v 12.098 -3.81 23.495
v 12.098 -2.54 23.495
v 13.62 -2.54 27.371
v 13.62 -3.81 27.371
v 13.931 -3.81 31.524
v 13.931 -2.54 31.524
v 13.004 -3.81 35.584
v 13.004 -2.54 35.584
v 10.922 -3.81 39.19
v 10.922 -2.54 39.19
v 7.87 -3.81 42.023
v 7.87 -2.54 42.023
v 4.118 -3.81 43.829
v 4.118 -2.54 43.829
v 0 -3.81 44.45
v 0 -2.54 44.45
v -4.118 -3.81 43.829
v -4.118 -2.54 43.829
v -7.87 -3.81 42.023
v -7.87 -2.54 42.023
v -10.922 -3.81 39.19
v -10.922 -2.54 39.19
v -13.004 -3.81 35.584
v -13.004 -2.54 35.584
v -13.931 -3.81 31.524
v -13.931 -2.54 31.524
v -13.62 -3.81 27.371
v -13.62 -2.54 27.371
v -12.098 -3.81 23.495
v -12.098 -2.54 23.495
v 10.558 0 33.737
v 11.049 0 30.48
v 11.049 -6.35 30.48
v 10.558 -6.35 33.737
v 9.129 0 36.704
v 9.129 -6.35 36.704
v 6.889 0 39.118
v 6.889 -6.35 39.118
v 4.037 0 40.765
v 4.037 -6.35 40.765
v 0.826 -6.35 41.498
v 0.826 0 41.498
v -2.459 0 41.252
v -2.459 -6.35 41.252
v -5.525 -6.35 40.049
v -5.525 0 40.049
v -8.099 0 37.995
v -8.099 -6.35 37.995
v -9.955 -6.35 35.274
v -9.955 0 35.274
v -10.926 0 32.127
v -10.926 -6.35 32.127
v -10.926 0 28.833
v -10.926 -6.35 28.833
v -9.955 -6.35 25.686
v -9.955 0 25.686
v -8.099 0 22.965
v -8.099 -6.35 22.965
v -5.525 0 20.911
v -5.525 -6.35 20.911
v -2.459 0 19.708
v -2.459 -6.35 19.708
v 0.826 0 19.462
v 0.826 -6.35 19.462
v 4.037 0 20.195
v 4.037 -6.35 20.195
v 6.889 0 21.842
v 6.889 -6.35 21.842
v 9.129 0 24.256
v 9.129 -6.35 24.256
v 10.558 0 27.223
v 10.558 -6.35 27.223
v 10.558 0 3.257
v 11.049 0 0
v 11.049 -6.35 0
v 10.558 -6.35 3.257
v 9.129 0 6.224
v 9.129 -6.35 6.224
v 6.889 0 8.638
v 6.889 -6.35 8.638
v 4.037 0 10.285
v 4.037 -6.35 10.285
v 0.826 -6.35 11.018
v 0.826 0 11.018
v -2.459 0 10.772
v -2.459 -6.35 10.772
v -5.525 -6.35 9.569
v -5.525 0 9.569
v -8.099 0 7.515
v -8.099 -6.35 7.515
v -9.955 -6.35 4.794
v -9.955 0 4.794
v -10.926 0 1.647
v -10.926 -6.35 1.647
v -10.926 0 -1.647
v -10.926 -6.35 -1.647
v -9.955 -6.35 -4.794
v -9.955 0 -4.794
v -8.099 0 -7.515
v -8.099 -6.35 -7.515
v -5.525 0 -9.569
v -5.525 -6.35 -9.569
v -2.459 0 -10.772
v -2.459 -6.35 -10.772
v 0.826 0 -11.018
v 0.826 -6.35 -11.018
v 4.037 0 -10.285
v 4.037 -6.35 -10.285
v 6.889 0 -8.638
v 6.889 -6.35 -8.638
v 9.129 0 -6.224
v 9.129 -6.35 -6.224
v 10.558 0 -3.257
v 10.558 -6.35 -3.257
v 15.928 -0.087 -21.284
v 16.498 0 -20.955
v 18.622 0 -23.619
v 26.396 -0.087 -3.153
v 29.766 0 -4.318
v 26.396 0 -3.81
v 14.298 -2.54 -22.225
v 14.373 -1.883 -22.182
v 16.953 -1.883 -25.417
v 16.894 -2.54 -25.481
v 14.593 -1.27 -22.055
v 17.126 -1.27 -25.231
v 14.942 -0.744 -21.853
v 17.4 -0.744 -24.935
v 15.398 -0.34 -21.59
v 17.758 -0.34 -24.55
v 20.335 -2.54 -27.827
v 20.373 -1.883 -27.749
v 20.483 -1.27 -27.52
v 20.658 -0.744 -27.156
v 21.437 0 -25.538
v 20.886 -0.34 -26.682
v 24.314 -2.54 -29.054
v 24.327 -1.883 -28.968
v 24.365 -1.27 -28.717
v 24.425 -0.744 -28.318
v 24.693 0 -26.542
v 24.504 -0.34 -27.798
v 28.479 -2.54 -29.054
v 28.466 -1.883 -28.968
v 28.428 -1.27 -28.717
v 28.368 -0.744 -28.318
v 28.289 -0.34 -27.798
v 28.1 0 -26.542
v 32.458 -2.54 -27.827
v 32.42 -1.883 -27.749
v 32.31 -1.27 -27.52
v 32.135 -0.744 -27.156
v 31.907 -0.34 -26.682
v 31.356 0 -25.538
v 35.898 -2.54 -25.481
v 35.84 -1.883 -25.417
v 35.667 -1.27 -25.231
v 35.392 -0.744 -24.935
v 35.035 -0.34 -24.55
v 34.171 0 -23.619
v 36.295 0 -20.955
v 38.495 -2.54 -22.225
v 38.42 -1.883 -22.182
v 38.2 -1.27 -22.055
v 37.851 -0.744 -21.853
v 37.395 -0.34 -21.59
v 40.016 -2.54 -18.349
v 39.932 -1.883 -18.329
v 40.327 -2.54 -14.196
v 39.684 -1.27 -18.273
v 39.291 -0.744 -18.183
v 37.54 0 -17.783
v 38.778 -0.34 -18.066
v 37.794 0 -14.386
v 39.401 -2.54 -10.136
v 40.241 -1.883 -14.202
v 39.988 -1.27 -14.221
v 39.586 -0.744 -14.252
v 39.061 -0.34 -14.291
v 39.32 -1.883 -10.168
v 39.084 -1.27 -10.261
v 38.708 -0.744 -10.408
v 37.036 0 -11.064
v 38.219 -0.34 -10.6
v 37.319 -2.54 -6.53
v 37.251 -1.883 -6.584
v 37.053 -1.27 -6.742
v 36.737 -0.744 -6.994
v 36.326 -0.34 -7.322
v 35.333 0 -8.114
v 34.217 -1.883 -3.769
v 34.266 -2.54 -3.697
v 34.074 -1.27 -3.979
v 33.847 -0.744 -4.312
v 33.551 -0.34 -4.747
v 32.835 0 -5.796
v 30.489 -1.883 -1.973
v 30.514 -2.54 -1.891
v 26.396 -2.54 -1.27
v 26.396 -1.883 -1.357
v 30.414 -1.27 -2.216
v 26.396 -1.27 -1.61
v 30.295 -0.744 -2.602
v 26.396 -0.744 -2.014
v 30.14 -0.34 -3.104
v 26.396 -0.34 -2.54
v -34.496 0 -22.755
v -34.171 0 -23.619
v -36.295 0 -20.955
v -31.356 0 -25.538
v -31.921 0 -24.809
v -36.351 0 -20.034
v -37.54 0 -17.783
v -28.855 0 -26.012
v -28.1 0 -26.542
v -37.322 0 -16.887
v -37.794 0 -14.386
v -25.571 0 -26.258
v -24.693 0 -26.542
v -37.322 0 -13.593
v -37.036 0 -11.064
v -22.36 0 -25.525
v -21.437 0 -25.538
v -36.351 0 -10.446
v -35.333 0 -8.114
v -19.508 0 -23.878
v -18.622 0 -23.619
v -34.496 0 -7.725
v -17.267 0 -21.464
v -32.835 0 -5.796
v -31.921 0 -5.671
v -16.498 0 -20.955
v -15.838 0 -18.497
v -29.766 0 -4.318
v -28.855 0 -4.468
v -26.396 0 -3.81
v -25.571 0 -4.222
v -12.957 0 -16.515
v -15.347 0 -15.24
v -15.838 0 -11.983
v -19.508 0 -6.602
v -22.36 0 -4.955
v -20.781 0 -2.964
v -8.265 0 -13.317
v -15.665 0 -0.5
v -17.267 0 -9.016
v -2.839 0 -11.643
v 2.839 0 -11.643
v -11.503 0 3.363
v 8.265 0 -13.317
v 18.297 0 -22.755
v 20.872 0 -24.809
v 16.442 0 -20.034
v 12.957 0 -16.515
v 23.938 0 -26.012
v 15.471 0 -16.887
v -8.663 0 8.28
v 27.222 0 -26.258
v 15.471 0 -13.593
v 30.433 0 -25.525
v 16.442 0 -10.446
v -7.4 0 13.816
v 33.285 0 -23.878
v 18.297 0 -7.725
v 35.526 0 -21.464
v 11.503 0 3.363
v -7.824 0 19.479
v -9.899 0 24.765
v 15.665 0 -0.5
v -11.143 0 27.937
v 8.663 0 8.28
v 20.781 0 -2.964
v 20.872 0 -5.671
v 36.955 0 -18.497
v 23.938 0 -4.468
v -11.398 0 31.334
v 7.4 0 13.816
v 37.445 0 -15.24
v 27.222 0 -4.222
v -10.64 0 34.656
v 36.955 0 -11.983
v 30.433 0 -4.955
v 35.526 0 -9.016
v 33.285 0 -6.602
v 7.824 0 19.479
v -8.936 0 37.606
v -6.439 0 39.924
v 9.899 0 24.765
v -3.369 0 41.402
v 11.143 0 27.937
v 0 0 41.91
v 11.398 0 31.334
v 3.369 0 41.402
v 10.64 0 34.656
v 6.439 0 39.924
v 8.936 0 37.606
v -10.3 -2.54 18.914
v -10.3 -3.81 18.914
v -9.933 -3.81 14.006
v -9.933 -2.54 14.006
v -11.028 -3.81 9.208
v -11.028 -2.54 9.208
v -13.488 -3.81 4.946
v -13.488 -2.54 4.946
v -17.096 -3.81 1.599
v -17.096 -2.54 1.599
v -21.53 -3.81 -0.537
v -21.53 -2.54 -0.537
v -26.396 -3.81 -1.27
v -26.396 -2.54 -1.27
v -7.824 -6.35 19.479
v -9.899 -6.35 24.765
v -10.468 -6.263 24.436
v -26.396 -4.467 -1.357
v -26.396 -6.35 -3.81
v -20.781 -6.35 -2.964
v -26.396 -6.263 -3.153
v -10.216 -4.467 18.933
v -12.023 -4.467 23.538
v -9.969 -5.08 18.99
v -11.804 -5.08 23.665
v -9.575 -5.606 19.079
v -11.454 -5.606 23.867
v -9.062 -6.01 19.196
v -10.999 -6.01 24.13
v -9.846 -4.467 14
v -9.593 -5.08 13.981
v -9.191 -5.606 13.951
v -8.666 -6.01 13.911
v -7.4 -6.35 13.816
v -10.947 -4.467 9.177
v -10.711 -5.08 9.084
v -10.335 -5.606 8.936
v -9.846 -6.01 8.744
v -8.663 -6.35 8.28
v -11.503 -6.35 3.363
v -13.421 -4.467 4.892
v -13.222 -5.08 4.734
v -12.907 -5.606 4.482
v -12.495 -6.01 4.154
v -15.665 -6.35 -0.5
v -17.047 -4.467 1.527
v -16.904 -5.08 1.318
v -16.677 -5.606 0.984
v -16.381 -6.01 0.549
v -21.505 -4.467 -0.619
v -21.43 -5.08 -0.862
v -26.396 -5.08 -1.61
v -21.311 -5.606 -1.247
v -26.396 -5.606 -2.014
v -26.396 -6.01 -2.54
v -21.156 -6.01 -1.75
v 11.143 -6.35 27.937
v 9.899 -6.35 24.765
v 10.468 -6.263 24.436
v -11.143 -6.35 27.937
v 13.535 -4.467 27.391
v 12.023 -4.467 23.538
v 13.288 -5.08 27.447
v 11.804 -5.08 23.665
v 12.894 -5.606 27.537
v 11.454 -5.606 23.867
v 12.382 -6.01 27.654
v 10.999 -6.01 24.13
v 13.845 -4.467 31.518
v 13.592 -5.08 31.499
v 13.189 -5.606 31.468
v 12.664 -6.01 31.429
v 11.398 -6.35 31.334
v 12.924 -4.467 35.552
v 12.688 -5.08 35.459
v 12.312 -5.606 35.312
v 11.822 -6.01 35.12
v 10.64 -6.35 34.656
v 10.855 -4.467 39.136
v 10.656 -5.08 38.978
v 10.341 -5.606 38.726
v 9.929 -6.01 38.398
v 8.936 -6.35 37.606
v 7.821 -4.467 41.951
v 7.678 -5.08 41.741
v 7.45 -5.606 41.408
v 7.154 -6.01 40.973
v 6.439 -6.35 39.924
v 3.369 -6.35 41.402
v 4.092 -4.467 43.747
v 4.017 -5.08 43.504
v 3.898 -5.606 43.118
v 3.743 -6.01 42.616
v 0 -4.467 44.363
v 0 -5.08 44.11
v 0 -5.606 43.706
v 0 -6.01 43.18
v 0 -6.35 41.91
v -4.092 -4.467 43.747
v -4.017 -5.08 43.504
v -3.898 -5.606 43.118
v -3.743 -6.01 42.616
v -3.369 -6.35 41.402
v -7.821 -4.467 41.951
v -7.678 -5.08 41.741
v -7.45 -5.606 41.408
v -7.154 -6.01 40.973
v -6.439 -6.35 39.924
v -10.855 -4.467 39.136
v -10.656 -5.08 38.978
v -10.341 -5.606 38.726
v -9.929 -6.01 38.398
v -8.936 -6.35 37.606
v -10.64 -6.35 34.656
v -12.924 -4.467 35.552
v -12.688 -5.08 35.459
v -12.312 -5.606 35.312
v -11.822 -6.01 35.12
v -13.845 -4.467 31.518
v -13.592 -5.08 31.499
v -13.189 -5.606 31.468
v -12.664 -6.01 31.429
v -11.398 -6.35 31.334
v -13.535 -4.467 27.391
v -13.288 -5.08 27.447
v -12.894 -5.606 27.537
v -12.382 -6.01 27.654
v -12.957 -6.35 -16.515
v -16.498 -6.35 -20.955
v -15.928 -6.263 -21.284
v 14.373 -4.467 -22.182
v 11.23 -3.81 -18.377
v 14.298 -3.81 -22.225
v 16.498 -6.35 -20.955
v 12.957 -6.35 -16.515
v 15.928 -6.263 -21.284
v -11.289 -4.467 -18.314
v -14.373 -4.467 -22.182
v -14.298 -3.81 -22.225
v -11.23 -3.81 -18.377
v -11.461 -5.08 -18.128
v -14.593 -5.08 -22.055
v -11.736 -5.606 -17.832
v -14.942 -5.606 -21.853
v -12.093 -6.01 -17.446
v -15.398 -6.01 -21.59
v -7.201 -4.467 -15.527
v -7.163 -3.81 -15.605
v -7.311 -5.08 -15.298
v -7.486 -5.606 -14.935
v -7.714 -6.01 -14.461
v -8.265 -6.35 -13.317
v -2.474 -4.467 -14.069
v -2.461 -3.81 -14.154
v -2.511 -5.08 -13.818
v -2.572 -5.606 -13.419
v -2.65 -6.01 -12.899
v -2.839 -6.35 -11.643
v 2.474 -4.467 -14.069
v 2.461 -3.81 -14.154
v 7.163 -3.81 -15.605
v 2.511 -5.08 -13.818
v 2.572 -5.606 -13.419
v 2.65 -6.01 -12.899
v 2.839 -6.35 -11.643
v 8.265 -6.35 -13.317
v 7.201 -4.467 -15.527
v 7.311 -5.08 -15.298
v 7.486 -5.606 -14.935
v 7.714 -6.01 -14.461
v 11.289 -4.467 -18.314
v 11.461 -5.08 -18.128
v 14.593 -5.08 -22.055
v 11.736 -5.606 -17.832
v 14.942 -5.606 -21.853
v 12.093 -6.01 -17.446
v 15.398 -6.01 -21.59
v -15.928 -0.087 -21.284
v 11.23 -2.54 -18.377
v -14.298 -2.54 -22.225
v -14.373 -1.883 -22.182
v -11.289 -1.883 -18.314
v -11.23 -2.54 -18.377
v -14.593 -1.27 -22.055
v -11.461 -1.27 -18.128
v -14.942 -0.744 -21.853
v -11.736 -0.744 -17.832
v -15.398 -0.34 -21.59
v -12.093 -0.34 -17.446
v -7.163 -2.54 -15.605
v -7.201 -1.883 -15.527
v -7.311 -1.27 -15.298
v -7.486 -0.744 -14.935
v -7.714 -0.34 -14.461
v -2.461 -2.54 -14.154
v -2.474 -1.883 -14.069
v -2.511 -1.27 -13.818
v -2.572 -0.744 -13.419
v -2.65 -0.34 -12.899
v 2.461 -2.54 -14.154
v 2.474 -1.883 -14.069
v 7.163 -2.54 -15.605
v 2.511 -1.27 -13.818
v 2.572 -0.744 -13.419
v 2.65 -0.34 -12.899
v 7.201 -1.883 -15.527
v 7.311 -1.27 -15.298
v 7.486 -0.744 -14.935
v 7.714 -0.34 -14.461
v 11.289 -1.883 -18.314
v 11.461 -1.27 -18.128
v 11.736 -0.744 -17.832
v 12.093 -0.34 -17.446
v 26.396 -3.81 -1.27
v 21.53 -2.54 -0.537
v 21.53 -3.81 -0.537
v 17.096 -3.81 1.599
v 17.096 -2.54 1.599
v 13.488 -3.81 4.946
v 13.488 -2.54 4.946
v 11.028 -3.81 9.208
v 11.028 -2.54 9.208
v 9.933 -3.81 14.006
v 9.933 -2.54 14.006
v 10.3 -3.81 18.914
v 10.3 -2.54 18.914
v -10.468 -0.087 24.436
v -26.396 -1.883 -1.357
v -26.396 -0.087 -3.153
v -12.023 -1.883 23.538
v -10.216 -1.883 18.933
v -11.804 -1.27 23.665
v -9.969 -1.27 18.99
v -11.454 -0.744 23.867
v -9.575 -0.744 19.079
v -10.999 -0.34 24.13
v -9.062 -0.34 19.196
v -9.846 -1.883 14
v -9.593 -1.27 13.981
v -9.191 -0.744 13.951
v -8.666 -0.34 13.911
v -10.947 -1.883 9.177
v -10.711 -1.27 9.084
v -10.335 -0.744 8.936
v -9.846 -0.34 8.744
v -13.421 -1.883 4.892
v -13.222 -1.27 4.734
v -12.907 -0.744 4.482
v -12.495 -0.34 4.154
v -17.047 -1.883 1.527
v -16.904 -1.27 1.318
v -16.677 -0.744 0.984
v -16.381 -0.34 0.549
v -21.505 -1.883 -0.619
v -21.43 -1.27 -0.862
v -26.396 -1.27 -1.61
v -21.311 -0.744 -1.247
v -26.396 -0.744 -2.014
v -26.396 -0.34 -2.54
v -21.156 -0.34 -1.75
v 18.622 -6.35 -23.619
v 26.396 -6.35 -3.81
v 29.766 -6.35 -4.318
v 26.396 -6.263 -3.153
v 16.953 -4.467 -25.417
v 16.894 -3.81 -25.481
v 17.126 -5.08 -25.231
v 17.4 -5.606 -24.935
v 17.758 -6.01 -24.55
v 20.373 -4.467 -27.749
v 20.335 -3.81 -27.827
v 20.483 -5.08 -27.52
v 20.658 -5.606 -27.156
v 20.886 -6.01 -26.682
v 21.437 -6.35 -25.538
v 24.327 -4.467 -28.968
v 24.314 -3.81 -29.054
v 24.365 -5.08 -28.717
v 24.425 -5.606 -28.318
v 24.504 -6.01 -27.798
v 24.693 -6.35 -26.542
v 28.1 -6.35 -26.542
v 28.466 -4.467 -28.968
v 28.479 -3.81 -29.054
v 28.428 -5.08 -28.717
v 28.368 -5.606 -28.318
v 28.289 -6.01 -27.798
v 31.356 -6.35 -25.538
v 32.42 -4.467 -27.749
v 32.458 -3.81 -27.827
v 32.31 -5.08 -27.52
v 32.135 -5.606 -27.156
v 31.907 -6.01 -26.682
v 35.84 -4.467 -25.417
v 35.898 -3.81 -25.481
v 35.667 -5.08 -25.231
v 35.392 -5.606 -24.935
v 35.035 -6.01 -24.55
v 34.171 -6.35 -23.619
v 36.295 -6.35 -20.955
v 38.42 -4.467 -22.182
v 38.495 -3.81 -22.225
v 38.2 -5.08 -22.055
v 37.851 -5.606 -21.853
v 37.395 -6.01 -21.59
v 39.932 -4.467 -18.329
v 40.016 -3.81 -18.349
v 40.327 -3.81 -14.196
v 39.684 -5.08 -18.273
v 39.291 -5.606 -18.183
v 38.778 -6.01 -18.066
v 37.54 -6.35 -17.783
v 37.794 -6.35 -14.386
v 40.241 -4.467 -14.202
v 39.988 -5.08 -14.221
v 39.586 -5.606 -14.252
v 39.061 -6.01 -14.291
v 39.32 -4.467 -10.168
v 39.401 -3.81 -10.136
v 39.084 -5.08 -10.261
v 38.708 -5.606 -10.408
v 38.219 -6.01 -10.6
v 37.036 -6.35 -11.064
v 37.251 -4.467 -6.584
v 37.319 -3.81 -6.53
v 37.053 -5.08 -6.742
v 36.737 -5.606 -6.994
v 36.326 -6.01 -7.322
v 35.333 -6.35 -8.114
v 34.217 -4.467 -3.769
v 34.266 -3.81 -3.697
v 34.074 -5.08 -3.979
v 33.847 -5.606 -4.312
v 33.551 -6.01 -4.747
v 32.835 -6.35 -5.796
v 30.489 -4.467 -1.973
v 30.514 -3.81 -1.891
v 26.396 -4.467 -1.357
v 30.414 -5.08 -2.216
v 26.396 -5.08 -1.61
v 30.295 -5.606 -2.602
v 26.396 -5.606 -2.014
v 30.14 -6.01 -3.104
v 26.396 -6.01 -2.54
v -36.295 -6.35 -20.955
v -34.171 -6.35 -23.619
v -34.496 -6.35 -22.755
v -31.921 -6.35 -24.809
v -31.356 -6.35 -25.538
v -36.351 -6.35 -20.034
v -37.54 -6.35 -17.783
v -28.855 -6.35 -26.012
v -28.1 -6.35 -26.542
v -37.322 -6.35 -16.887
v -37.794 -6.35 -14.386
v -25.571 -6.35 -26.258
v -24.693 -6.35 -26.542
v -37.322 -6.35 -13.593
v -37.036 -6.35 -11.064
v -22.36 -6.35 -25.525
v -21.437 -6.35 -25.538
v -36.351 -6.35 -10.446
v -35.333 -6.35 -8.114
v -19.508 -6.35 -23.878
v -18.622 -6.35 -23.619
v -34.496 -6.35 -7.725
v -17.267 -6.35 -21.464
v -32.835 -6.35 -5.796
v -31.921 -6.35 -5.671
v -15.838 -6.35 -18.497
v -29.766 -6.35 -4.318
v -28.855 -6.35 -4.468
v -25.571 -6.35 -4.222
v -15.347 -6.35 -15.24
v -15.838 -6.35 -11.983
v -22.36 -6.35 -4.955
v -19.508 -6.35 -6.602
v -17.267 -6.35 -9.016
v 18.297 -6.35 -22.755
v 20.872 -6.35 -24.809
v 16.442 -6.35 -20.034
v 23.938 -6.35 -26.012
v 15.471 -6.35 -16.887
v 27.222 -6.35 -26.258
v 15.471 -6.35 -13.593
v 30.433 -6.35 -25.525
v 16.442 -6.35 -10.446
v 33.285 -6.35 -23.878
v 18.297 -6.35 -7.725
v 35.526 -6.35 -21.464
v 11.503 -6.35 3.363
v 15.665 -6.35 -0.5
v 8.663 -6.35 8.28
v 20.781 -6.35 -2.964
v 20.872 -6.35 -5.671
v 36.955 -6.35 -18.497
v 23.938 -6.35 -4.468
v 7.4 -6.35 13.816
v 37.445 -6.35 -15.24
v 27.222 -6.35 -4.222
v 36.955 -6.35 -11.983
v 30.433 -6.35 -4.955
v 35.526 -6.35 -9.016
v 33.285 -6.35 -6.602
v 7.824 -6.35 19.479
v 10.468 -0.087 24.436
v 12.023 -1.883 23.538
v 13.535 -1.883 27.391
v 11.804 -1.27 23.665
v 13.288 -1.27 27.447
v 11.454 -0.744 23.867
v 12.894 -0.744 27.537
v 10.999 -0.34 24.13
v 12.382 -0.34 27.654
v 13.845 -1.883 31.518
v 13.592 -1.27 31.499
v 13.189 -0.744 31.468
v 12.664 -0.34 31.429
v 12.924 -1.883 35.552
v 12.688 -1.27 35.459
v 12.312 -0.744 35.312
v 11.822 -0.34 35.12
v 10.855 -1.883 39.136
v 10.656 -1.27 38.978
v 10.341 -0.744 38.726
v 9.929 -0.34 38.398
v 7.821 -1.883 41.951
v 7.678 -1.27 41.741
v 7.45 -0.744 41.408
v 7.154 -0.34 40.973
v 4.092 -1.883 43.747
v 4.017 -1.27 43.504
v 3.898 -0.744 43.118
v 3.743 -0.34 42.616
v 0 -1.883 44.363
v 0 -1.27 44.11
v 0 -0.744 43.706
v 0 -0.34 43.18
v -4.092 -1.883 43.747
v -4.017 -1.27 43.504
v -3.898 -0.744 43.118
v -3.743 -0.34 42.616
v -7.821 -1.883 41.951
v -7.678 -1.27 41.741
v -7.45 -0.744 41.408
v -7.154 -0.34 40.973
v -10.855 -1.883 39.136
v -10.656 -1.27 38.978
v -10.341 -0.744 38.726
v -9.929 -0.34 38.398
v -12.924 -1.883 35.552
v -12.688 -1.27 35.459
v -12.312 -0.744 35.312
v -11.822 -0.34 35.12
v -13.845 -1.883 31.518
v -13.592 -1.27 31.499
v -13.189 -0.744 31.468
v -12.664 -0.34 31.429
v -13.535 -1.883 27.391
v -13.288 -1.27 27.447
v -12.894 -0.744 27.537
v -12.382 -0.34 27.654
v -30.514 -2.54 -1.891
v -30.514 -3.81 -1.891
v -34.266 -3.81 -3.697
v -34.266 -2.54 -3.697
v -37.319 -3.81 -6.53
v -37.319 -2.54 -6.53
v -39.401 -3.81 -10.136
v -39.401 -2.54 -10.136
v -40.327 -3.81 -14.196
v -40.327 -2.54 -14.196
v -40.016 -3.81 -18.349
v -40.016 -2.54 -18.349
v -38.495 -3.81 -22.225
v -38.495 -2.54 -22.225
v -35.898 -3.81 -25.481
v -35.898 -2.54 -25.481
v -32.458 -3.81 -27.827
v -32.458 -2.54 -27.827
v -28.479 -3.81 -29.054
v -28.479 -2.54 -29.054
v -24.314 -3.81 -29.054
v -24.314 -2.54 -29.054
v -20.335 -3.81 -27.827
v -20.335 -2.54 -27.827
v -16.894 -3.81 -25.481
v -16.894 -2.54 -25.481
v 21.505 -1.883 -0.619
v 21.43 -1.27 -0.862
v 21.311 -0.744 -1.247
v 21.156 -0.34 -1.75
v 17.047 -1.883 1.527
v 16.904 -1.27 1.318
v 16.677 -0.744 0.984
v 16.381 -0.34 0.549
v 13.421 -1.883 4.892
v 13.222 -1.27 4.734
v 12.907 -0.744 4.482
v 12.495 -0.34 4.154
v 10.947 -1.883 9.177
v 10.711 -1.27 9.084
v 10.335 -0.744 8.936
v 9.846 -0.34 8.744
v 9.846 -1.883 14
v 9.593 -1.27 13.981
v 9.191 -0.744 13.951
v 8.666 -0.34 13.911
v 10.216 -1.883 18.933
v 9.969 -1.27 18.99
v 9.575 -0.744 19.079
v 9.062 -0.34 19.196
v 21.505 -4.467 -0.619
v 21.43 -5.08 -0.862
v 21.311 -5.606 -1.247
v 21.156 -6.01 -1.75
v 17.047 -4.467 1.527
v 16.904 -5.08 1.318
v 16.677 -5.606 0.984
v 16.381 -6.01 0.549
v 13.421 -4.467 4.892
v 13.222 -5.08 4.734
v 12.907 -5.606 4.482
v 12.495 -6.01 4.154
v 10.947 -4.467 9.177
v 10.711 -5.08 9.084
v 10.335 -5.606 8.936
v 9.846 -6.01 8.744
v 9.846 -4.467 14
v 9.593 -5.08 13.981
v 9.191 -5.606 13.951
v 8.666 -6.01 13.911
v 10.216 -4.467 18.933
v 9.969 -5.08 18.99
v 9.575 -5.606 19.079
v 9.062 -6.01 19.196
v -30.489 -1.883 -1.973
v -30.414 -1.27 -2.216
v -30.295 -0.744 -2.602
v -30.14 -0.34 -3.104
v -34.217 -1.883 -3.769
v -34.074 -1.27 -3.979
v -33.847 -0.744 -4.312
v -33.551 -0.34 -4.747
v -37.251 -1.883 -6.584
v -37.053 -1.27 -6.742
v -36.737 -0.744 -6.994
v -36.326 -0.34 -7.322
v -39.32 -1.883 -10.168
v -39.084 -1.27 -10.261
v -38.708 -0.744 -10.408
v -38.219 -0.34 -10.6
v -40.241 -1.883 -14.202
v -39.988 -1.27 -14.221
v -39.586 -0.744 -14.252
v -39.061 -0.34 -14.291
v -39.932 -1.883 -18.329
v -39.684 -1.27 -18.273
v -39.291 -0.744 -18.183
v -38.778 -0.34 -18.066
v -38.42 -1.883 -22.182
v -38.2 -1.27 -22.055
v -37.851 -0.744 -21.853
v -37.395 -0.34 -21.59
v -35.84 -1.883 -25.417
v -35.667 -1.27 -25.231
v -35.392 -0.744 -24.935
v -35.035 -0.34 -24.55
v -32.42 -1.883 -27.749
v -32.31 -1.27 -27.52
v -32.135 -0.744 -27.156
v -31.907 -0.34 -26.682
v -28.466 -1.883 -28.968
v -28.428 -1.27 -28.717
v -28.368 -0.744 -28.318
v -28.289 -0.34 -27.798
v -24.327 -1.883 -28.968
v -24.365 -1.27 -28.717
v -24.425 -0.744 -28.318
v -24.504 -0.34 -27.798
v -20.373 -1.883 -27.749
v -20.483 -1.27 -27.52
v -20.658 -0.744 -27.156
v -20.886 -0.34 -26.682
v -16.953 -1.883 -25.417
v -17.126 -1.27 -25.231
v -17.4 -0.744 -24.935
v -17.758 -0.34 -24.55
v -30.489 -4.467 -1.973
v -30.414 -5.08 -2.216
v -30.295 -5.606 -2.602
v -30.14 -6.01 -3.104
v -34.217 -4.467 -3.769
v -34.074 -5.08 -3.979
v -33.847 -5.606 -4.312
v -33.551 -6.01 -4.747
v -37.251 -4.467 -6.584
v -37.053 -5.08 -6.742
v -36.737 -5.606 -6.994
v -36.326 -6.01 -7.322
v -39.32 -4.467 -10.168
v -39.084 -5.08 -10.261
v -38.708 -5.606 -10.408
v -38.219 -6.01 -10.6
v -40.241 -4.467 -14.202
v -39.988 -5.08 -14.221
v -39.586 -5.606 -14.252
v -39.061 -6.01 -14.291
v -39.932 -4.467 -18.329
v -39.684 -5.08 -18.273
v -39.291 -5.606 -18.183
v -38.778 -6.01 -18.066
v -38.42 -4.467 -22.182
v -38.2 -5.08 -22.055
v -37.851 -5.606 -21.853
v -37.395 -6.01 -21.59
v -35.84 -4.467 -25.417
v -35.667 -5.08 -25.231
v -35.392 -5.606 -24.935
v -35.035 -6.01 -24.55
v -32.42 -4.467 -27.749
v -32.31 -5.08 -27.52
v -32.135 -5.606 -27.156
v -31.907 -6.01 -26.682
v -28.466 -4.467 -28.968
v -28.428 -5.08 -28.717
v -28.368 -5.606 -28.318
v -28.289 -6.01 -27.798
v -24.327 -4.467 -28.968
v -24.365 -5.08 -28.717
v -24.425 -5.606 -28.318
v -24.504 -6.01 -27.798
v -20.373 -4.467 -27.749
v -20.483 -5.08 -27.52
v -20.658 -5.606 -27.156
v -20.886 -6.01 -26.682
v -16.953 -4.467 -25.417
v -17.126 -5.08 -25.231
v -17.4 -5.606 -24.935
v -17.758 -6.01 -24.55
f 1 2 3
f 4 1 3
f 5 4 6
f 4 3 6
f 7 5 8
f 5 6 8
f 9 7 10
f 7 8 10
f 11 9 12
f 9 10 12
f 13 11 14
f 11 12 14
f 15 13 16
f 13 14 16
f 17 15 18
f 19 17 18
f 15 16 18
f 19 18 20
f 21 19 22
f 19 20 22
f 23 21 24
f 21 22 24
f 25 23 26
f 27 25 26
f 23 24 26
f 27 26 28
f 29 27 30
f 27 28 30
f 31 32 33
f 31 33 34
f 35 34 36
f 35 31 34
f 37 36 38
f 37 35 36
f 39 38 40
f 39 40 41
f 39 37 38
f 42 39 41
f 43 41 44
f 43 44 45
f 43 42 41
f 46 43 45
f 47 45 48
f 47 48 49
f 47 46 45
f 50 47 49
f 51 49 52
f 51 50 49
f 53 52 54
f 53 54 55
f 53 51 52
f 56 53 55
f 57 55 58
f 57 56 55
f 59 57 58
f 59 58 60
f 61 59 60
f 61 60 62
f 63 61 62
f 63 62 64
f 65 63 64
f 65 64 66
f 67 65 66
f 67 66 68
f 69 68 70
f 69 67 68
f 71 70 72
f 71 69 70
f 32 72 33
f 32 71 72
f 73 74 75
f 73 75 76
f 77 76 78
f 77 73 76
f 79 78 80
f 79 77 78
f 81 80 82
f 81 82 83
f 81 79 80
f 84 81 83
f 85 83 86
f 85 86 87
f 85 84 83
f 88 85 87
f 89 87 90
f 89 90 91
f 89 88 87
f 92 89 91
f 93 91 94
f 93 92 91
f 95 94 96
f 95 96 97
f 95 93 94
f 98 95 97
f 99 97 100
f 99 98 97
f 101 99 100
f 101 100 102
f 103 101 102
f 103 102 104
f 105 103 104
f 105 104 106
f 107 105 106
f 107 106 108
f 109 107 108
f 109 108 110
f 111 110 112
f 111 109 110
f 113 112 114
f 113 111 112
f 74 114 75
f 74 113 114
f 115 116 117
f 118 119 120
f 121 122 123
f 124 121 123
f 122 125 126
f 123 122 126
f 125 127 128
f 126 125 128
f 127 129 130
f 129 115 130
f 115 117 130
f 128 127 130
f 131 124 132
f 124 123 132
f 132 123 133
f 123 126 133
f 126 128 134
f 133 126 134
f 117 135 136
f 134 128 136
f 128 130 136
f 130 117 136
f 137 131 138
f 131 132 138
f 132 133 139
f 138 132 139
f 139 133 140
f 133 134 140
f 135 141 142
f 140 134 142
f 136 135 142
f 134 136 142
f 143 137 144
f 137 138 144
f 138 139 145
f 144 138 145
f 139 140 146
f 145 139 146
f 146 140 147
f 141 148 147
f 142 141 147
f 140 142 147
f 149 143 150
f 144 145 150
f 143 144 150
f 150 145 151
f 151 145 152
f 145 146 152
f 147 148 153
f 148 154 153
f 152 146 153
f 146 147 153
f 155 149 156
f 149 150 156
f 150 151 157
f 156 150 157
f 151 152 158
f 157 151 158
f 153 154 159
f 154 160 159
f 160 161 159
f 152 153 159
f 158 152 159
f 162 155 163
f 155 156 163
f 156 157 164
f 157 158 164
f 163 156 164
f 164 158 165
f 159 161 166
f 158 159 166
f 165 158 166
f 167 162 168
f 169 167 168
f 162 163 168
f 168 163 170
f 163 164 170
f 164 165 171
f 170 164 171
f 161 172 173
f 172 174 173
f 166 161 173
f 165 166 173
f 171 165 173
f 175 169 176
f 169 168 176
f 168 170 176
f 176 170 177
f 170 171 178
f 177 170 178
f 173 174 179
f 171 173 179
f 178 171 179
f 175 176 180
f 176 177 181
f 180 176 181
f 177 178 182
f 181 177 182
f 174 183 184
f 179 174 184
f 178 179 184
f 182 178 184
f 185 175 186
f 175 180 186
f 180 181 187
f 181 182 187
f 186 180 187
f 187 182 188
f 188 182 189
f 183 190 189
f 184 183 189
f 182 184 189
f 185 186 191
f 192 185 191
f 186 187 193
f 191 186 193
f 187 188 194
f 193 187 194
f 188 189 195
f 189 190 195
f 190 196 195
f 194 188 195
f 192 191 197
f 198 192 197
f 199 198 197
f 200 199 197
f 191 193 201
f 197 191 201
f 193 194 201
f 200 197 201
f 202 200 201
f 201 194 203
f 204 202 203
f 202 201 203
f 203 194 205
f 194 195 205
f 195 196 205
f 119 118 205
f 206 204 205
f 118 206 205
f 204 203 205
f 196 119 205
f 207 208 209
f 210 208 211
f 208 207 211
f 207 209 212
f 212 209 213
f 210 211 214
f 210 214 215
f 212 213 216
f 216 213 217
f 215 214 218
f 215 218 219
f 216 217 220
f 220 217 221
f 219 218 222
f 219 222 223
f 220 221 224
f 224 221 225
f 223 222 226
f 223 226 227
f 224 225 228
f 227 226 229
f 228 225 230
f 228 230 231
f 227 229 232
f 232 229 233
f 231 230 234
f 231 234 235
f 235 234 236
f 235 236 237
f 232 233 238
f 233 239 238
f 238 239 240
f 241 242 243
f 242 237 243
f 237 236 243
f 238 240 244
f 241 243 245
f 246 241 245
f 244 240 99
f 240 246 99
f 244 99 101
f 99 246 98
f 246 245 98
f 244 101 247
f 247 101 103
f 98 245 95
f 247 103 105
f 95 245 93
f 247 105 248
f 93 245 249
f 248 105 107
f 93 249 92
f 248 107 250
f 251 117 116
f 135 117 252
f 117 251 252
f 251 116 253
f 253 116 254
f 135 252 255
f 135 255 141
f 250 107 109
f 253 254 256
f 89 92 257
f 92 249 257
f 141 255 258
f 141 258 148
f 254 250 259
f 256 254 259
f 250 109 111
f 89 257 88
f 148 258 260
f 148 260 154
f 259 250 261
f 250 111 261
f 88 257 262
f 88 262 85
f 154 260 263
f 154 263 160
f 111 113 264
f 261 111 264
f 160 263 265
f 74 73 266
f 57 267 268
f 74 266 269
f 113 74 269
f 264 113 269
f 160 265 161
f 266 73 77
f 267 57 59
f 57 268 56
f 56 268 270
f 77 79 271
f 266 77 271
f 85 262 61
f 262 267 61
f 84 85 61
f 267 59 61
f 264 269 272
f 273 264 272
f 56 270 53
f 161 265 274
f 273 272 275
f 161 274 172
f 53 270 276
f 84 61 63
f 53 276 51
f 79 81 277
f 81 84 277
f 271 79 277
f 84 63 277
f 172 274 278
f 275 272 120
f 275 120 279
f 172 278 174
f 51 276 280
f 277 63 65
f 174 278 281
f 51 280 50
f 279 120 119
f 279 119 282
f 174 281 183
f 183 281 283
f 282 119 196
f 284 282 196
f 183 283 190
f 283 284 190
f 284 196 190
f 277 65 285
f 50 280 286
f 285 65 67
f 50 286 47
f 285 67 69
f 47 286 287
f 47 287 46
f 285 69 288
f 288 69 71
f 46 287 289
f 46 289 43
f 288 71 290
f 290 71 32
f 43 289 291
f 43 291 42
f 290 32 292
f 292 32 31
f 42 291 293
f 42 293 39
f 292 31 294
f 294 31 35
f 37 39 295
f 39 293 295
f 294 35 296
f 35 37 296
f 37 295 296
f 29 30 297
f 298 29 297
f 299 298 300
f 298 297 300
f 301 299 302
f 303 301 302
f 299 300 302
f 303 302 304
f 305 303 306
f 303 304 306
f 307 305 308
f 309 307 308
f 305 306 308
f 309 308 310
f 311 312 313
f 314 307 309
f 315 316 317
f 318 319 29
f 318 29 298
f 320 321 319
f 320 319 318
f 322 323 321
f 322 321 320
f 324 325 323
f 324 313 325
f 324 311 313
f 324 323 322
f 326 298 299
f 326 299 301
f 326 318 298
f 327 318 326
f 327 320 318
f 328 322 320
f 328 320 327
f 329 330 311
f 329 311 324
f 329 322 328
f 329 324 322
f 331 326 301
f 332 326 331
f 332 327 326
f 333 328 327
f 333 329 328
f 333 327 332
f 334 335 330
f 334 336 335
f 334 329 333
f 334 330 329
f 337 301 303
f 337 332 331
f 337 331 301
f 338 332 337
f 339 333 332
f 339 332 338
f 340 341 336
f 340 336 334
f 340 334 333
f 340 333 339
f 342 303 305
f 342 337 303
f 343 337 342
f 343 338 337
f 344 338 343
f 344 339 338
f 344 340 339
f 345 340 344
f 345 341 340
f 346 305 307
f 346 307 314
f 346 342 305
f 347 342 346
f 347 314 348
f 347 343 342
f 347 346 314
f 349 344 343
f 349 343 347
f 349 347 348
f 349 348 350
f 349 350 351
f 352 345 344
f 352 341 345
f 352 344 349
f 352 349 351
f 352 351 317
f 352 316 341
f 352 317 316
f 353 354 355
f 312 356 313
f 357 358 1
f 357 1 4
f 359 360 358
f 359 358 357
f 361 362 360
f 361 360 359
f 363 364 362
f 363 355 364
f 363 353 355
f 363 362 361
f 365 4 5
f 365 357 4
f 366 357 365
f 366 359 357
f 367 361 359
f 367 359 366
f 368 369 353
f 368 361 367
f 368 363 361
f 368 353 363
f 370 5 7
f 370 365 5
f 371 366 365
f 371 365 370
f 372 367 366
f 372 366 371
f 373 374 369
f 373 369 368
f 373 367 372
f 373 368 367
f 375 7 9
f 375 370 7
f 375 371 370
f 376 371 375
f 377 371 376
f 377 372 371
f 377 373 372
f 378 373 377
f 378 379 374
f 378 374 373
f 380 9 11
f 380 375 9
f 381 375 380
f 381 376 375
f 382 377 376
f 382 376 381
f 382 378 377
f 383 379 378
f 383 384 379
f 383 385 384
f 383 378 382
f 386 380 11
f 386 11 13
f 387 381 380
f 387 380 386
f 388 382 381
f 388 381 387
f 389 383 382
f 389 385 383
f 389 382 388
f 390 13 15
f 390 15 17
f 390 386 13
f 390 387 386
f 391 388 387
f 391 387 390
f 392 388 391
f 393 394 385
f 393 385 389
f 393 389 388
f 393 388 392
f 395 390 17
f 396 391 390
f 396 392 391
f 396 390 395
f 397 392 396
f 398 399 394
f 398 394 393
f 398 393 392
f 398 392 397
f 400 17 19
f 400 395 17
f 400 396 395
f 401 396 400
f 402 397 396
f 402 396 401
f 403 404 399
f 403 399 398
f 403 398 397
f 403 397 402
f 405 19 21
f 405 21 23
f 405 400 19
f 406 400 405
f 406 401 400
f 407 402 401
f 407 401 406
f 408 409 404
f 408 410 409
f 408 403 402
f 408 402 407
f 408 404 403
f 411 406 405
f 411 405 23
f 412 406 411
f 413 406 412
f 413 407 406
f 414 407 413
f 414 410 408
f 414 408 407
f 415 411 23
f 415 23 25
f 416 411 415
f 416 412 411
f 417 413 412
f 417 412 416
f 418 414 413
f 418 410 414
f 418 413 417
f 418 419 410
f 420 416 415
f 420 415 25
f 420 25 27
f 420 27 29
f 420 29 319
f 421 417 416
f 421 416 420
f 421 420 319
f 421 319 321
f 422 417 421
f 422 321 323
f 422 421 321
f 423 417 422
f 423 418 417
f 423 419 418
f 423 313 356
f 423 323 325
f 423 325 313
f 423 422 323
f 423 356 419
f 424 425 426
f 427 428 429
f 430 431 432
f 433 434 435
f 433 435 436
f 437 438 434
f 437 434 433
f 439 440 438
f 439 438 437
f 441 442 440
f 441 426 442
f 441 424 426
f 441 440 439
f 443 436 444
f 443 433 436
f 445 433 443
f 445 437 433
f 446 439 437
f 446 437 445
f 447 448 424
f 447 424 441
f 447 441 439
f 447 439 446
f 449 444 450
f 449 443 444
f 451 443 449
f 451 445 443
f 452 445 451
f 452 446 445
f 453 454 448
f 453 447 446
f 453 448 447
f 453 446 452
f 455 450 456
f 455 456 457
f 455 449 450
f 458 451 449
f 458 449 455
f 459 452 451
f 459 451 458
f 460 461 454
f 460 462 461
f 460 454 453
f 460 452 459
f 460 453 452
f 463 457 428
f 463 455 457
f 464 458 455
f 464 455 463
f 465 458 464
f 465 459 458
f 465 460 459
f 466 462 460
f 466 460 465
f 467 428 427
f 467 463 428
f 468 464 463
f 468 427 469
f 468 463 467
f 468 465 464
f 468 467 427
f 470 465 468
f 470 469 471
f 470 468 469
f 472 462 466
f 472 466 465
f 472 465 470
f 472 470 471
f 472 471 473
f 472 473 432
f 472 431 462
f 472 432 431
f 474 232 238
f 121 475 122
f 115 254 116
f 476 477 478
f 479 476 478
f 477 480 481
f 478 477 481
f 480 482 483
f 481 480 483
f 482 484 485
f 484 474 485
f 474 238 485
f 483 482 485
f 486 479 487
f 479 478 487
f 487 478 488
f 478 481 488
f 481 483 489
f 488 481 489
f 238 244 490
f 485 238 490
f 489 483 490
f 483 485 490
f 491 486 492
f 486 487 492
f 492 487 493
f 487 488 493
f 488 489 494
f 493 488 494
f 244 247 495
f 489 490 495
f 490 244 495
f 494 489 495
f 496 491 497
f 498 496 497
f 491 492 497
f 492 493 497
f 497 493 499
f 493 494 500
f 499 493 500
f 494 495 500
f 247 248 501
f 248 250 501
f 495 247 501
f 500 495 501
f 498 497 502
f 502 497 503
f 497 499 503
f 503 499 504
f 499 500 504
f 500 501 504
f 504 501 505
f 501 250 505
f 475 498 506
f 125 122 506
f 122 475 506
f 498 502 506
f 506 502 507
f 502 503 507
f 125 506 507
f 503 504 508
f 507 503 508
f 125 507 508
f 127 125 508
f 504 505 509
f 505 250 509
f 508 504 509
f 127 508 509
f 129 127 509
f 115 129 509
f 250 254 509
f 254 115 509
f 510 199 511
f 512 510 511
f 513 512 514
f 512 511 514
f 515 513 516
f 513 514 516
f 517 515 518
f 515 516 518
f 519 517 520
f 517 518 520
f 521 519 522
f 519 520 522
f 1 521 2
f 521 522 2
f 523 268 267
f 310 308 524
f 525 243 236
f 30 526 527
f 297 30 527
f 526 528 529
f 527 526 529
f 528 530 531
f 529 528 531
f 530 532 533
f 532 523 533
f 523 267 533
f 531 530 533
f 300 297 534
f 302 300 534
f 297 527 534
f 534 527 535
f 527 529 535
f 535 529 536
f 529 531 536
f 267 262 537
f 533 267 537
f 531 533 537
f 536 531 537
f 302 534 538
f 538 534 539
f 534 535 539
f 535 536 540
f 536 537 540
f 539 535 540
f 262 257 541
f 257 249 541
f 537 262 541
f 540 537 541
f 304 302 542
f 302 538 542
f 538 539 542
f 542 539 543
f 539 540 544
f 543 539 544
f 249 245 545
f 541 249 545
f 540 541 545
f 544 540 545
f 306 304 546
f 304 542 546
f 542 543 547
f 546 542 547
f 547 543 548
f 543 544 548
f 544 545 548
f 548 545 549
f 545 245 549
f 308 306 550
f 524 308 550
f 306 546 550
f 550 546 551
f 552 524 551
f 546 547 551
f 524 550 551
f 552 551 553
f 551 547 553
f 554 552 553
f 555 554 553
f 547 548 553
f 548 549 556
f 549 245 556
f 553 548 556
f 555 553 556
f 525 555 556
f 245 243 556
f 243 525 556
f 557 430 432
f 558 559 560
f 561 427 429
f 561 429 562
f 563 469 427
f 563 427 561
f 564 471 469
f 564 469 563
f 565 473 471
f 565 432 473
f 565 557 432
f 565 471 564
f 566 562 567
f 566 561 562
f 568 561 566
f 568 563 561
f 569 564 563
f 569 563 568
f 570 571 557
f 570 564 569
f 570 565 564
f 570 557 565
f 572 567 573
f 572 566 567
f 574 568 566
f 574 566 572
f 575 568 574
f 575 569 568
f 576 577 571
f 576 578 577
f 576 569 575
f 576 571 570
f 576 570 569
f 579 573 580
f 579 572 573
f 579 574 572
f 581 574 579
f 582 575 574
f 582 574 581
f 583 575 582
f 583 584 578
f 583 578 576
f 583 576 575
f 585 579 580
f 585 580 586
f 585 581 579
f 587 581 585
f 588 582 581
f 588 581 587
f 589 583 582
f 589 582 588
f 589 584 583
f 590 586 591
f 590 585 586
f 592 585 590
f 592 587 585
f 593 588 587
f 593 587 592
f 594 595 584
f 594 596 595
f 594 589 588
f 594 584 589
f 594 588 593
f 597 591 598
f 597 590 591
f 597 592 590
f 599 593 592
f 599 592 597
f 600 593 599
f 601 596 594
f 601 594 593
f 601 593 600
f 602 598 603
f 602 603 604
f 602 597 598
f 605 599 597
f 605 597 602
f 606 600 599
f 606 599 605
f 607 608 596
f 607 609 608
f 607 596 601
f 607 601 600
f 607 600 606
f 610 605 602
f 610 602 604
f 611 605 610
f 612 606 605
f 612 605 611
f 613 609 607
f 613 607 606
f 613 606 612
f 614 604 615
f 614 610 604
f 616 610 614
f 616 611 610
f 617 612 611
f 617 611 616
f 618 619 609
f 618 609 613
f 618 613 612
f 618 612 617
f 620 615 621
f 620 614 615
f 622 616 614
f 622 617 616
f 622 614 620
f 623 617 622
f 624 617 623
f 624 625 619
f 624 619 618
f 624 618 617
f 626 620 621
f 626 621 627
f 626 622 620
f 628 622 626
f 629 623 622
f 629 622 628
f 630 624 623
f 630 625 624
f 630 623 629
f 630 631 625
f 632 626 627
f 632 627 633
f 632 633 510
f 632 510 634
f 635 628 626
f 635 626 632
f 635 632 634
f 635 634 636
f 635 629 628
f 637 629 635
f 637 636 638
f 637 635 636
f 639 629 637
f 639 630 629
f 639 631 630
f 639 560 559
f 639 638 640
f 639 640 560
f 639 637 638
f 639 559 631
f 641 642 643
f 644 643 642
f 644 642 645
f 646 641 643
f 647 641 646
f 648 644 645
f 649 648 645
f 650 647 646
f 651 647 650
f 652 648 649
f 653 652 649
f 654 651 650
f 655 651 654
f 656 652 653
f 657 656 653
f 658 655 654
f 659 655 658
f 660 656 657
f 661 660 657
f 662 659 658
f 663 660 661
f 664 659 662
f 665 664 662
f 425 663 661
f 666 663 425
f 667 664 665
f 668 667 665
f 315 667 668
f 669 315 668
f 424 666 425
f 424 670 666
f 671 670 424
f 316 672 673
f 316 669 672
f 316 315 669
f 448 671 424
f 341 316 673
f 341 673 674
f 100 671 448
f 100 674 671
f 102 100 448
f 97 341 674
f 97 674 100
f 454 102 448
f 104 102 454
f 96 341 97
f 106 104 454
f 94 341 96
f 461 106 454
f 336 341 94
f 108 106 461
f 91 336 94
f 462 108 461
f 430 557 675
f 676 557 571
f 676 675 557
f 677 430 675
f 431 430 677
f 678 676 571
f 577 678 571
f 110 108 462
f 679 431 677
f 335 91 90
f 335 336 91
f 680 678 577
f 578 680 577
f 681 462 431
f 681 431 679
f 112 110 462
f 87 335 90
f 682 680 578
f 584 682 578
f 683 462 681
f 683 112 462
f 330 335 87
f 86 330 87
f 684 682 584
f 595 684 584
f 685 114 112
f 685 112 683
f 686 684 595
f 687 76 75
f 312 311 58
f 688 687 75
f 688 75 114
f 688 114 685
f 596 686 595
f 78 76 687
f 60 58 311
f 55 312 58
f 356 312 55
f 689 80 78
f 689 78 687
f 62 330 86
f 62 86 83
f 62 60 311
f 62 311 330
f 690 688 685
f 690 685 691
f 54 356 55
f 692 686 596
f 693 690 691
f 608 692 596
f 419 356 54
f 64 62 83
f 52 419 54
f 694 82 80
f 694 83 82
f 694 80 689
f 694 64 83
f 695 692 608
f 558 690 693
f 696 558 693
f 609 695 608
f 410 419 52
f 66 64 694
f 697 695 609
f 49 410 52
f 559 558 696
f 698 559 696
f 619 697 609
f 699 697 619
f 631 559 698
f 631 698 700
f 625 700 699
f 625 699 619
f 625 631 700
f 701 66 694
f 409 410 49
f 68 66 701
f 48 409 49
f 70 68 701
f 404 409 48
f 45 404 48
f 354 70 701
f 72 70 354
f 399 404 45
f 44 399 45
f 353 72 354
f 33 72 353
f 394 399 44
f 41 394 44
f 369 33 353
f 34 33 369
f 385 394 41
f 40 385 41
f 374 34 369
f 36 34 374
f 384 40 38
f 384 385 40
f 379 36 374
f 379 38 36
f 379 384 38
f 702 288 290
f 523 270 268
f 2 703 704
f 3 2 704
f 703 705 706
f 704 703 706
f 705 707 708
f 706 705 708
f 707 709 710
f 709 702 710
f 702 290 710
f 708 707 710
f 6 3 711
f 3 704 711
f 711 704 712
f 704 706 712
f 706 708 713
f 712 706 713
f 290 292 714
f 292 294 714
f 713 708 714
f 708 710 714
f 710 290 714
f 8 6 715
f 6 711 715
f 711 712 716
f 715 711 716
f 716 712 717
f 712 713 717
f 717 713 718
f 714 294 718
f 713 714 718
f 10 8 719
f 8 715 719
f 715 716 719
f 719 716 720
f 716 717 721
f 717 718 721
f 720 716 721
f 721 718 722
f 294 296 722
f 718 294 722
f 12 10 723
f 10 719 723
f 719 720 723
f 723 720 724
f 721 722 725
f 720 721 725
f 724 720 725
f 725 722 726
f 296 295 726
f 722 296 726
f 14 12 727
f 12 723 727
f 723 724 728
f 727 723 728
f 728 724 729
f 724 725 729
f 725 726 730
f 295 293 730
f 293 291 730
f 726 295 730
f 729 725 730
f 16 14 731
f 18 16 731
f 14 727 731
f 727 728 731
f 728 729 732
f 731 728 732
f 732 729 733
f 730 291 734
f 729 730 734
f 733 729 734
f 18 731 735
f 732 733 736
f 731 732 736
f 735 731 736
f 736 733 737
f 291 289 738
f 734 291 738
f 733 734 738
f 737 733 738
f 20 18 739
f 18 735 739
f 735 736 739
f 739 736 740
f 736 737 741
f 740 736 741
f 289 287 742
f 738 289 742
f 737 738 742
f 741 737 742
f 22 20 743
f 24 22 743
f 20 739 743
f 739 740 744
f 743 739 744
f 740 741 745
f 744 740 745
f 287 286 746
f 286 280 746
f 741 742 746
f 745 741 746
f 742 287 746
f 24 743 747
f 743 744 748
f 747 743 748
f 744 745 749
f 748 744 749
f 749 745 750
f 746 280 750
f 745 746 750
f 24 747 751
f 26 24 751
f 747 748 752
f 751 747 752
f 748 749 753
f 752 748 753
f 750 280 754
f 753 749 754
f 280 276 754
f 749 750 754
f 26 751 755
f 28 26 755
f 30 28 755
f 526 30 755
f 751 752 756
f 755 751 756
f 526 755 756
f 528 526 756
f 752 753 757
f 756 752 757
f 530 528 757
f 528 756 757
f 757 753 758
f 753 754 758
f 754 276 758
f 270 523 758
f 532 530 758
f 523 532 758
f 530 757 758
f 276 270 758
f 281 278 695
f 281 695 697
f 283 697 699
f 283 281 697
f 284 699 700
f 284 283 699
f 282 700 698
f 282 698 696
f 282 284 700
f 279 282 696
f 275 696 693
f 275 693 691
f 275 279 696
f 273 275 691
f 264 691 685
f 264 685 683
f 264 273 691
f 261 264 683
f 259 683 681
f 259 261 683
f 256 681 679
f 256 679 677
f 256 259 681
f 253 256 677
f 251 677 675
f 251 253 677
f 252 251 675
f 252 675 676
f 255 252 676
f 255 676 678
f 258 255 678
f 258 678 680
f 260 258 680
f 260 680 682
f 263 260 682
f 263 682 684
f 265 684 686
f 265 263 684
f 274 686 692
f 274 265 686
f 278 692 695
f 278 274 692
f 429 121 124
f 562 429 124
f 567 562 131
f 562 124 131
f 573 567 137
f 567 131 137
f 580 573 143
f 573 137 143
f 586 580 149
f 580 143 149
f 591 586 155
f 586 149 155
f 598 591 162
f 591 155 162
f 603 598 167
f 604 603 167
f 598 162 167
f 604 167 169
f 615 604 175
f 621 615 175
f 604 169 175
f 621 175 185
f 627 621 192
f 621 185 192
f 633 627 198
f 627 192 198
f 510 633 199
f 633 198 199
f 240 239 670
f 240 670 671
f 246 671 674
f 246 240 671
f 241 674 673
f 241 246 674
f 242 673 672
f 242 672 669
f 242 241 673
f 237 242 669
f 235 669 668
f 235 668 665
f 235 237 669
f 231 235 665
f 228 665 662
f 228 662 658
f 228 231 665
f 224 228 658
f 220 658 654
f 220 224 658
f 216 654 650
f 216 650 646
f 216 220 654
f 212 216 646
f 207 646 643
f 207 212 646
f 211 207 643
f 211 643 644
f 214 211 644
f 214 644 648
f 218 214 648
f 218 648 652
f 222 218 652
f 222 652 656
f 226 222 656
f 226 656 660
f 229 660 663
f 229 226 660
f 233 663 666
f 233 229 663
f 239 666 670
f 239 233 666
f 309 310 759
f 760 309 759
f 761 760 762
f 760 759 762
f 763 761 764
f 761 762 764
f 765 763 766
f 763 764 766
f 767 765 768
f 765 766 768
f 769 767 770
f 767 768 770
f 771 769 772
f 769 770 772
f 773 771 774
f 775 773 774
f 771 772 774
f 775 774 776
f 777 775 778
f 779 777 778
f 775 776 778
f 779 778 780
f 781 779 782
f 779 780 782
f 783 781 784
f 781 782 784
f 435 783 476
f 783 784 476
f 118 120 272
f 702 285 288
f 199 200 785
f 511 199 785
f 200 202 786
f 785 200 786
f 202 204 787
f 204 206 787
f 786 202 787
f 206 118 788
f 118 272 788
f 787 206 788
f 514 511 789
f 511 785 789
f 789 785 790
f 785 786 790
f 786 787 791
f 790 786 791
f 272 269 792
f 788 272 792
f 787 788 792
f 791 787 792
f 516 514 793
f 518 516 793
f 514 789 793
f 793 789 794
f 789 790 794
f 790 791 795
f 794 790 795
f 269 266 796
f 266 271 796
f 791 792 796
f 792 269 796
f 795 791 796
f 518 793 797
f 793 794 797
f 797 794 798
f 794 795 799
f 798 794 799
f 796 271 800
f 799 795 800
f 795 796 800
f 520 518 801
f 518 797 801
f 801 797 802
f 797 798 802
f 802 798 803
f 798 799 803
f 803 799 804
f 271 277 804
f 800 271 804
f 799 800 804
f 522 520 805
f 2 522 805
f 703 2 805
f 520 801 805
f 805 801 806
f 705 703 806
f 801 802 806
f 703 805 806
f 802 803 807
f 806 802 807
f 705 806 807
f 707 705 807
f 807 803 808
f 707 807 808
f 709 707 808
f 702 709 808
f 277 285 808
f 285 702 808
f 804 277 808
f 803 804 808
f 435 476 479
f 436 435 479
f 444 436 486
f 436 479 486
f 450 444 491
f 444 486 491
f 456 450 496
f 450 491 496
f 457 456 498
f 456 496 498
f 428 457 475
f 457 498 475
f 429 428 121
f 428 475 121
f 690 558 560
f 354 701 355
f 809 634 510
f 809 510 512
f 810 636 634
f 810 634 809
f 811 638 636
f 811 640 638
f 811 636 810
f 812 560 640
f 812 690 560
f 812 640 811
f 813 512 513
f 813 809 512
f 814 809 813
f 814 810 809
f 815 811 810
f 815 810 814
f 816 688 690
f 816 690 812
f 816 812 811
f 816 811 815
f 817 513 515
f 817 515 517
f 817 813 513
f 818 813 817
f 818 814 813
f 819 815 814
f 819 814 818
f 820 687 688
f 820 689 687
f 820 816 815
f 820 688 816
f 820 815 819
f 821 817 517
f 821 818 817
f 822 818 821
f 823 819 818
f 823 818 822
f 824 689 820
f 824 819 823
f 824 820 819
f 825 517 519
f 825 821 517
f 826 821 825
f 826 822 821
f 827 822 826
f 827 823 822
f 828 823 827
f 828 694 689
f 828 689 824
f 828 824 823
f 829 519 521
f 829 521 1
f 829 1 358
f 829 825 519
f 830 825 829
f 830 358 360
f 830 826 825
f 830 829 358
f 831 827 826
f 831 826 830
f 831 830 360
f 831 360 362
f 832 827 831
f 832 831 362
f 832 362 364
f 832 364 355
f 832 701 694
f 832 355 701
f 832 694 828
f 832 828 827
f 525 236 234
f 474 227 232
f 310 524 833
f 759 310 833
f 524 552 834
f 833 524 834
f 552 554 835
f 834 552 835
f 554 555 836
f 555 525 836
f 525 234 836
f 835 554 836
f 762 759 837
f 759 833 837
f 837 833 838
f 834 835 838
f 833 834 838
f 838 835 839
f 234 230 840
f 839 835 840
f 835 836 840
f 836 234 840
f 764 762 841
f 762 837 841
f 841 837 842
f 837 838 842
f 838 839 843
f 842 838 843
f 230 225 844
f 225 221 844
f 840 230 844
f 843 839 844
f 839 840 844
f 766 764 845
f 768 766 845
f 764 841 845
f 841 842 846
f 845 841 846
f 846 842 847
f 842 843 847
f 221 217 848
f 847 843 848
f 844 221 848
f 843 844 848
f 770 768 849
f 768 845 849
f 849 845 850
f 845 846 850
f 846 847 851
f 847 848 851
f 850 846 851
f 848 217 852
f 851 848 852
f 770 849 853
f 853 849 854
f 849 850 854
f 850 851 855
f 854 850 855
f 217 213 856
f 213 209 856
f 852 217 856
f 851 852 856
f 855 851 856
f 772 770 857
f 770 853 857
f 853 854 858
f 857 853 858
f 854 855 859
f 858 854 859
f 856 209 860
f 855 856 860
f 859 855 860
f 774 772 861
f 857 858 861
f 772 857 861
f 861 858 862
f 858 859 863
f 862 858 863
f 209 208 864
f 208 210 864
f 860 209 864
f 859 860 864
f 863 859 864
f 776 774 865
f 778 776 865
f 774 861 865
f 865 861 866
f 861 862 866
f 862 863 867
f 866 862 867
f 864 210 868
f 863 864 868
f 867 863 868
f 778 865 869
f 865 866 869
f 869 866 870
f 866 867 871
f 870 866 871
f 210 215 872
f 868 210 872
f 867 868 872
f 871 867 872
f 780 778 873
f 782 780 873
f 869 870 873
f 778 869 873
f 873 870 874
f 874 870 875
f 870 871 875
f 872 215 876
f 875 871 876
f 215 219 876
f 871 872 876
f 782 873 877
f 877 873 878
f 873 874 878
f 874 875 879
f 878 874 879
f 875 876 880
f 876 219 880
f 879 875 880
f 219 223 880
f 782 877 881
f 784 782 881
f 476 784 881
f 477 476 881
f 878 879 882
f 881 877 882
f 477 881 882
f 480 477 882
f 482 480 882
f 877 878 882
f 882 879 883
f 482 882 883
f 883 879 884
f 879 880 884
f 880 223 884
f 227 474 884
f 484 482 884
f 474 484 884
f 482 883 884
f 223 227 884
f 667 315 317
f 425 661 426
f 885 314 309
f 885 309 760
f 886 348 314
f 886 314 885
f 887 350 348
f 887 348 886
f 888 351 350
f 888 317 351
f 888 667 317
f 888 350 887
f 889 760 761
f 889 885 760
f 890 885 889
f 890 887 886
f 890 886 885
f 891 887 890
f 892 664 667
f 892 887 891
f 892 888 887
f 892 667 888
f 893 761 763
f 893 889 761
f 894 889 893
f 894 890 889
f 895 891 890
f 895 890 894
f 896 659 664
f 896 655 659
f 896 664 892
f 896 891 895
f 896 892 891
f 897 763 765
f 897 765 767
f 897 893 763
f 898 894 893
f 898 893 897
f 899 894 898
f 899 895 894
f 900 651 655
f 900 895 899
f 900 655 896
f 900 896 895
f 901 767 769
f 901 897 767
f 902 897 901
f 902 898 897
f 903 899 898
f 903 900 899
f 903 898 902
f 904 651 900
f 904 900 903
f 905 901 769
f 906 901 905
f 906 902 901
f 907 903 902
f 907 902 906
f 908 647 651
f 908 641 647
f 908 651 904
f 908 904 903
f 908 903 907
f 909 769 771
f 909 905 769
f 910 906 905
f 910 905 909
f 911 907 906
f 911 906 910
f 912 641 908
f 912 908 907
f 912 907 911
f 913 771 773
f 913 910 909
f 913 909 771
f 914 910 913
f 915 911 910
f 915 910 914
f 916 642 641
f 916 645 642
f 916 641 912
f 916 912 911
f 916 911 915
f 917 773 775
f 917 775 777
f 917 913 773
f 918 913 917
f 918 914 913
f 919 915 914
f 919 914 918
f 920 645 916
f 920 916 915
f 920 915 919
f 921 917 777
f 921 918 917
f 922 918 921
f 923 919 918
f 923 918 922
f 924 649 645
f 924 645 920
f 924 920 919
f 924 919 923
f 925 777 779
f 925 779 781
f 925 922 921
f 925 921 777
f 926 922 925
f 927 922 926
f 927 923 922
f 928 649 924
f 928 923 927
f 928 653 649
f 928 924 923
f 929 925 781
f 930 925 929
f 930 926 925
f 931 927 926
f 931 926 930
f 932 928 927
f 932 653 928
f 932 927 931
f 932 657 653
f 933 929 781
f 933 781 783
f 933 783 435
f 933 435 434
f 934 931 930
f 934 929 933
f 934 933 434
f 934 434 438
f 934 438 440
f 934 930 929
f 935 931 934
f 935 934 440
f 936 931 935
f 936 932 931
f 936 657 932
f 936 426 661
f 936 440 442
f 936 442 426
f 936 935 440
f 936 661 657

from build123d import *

# Parameters (mm, degrees)
F0_R     = 11.049
F1_DEPTH = 6.35
F2_R     = 2.54


with BuildPart() as f1:
    # F0 (on Front) → F1 (new body)
    with BuildSketch(Plane.XZ):
        with BuildLine():
            ThreePointArc((26.396454, -1.27), (12.098375, 6.985), (12.098375, 23.495))
            ThreePointArc((12.098375, 23.495), (0, 44.45), (-12.098375, 23.495))
            ThreePointArc((-12.098375, 23.495), (-12.098375, 6.985), (-26.396454, -1.27))
            ThreePointArc((-26.396454, -1.27), (-38.494829, -22.225), (-14.298079, -22.225))
            ThreePointArc((-14.298079, -22.225), (0, -13.97), (14.298079, -22.225))
            ThreePointArc((14.298079, -22.225), (38.494829, -22.225), (26.396454, -1.27))
        make_face()
        with Locations((-26.396454, -15.24)):
            Circle(F0_R, mode=Mode.SUBTRACT)
        with Locations((26.396454, -15.24)):
            Circle(F0_R, mode=Mode.SUBTRACT)
        Circle(F0_R, mode=Mode.SUBTRACT)
        with Locations((0, 30.48)):
            Circle(F0_R, mode=Mode.SUBTRACT)
    extrude(amount=F1_DEPTH)

    # F2
    f2_edges = [f1.edges().sort_by_distance(p)[0] for p in [
        (-12.098375, 0, 6.985),
        (0, -6.35, -13.97),
    ]]
    fillet(f2_edges, radius=F2_R)


solid = f1.part
